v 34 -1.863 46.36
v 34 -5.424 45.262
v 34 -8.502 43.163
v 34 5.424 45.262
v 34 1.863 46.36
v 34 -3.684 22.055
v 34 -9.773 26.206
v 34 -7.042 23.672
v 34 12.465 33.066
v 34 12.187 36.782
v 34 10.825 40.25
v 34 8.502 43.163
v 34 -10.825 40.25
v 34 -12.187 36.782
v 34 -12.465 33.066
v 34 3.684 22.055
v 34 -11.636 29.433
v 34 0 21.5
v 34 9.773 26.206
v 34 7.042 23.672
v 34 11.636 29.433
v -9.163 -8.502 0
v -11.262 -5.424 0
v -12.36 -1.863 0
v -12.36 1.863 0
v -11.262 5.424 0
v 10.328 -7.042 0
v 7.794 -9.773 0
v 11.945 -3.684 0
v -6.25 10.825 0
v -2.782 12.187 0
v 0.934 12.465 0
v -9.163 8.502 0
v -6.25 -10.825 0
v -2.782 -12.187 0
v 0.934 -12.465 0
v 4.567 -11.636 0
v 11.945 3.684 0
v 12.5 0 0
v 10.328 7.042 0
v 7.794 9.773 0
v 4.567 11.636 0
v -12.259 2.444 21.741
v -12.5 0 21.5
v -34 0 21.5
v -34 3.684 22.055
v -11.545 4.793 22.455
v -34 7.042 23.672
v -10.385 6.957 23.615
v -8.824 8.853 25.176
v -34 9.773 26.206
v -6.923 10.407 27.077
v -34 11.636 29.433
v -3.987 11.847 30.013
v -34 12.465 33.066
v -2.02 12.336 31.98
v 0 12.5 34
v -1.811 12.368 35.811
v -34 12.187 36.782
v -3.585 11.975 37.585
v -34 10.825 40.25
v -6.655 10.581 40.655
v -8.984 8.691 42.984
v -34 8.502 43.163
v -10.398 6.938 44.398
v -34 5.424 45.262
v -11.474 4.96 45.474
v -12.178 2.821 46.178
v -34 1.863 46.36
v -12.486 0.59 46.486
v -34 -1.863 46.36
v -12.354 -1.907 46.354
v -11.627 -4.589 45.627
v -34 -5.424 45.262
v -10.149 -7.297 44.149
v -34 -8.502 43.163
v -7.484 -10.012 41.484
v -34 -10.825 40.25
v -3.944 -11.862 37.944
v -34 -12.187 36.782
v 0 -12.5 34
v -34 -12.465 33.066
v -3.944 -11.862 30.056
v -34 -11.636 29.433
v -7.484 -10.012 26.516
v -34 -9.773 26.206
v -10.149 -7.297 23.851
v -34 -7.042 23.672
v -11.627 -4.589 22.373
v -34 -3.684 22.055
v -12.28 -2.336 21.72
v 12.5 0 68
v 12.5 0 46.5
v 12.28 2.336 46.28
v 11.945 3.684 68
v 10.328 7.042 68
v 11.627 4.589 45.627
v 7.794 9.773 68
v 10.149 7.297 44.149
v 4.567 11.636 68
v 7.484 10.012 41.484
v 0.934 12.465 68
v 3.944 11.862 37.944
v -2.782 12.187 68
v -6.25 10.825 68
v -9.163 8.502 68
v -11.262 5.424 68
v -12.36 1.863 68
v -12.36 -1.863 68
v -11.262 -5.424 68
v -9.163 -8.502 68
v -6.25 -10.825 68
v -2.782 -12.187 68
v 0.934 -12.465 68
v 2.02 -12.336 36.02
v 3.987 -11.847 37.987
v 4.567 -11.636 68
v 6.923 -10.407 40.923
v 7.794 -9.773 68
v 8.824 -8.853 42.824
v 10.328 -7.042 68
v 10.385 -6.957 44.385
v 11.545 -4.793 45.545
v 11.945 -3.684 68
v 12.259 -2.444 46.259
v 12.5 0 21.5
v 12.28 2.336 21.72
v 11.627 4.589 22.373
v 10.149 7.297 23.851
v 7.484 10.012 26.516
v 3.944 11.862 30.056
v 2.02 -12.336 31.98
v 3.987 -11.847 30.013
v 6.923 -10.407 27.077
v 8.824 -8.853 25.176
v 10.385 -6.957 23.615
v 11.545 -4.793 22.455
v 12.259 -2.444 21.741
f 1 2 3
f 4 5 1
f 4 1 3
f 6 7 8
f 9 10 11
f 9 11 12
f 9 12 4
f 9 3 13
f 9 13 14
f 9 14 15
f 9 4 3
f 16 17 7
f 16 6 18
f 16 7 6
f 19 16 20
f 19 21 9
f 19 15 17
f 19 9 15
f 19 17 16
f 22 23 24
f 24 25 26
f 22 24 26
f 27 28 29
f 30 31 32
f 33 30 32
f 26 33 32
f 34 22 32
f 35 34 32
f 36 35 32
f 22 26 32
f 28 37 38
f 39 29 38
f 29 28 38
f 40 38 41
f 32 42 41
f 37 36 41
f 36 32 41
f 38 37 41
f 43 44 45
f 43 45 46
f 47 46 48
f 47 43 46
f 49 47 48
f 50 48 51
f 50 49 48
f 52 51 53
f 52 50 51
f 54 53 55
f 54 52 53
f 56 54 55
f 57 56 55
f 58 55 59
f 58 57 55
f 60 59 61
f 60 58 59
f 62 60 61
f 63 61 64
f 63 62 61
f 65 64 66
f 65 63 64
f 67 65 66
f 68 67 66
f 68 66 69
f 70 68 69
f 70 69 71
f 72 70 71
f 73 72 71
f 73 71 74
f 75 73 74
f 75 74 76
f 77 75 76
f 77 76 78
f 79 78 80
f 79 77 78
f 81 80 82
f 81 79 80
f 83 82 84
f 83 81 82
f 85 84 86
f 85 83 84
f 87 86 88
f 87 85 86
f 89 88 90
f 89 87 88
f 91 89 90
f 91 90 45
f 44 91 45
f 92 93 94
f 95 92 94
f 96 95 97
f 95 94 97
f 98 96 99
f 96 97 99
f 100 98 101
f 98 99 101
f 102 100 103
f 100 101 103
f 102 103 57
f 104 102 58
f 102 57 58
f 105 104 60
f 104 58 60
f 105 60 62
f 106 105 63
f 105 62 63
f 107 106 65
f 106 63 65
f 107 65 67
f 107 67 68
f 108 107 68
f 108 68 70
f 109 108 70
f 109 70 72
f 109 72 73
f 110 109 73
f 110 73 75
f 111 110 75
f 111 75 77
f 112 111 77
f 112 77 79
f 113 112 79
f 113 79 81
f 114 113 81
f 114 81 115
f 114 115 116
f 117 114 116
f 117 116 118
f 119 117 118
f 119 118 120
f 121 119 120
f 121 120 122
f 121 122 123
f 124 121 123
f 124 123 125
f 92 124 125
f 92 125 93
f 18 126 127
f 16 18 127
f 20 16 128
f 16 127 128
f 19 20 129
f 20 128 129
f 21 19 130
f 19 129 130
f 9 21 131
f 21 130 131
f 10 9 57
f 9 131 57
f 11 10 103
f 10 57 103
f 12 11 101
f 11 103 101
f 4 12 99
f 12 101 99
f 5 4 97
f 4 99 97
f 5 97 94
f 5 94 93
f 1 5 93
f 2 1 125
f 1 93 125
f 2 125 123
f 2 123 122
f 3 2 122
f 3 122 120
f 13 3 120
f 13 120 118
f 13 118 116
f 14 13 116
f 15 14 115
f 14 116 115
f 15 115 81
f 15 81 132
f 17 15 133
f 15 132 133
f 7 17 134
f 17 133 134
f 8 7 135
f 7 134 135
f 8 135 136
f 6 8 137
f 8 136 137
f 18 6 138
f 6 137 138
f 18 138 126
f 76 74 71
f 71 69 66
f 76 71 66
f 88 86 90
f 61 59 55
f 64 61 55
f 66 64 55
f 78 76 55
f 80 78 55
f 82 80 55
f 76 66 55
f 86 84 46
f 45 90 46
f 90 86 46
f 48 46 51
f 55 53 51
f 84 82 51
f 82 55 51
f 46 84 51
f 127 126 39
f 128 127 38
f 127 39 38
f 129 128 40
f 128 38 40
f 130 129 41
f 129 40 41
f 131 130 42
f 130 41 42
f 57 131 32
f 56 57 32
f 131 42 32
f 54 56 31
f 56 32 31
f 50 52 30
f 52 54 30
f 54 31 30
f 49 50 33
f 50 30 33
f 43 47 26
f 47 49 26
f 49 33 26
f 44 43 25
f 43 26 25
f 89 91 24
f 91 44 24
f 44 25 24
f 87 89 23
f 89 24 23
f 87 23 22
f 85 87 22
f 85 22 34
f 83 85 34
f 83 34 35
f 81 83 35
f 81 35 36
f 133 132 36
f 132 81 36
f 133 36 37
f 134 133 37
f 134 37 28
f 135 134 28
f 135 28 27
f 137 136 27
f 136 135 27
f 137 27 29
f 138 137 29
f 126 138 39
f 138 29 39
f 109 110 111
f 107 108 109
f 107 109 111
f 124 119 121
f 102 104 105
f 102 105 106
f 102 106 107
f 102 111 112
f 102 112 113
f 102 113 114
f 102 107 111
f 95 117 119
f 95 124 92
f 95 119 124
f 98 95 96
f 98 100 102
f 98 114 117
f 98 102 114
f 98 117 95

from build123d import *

# Parameters (mm, degrees)
SKETCH1_R                = 12.5
BOSS_EXTRUDE1_DEPTH      = 68
BOSS_EXTRUDE2_DEPTH      = 34
BOSS_EXTRUDE2_DEPTH_BACK = 34
SKETCH2_R                = 12.5


with BuildPart() as part:
    # Sketch1 → Boss-Extrude1 (new body)
    with BuildSketch(Plane.XY):
        Circle(SKETCH1_R)
    extrude(amount=BOSS_EXTRUDE1_DEPTH)

    # Sketch2 → Boss-Extrude2 (add, two sides: drawn at the far end of the back side and taken through both)
    with BuildSketch(Plane(origin=(0, 0, 0), x_dir=(0, 0, -1), z_dir=(1, 0, 0)).offset(-BOSS_EXTRUDE2_DEPTH_BACK)):
        with Locations((-34, 0)):
            Circle(SKETCH2_R)
    extrude(amount=BOSS_EXTRUDE2_DEPTH + BOSS_EXTRUDE2_DEPTH_BACK)


solid = part.part
